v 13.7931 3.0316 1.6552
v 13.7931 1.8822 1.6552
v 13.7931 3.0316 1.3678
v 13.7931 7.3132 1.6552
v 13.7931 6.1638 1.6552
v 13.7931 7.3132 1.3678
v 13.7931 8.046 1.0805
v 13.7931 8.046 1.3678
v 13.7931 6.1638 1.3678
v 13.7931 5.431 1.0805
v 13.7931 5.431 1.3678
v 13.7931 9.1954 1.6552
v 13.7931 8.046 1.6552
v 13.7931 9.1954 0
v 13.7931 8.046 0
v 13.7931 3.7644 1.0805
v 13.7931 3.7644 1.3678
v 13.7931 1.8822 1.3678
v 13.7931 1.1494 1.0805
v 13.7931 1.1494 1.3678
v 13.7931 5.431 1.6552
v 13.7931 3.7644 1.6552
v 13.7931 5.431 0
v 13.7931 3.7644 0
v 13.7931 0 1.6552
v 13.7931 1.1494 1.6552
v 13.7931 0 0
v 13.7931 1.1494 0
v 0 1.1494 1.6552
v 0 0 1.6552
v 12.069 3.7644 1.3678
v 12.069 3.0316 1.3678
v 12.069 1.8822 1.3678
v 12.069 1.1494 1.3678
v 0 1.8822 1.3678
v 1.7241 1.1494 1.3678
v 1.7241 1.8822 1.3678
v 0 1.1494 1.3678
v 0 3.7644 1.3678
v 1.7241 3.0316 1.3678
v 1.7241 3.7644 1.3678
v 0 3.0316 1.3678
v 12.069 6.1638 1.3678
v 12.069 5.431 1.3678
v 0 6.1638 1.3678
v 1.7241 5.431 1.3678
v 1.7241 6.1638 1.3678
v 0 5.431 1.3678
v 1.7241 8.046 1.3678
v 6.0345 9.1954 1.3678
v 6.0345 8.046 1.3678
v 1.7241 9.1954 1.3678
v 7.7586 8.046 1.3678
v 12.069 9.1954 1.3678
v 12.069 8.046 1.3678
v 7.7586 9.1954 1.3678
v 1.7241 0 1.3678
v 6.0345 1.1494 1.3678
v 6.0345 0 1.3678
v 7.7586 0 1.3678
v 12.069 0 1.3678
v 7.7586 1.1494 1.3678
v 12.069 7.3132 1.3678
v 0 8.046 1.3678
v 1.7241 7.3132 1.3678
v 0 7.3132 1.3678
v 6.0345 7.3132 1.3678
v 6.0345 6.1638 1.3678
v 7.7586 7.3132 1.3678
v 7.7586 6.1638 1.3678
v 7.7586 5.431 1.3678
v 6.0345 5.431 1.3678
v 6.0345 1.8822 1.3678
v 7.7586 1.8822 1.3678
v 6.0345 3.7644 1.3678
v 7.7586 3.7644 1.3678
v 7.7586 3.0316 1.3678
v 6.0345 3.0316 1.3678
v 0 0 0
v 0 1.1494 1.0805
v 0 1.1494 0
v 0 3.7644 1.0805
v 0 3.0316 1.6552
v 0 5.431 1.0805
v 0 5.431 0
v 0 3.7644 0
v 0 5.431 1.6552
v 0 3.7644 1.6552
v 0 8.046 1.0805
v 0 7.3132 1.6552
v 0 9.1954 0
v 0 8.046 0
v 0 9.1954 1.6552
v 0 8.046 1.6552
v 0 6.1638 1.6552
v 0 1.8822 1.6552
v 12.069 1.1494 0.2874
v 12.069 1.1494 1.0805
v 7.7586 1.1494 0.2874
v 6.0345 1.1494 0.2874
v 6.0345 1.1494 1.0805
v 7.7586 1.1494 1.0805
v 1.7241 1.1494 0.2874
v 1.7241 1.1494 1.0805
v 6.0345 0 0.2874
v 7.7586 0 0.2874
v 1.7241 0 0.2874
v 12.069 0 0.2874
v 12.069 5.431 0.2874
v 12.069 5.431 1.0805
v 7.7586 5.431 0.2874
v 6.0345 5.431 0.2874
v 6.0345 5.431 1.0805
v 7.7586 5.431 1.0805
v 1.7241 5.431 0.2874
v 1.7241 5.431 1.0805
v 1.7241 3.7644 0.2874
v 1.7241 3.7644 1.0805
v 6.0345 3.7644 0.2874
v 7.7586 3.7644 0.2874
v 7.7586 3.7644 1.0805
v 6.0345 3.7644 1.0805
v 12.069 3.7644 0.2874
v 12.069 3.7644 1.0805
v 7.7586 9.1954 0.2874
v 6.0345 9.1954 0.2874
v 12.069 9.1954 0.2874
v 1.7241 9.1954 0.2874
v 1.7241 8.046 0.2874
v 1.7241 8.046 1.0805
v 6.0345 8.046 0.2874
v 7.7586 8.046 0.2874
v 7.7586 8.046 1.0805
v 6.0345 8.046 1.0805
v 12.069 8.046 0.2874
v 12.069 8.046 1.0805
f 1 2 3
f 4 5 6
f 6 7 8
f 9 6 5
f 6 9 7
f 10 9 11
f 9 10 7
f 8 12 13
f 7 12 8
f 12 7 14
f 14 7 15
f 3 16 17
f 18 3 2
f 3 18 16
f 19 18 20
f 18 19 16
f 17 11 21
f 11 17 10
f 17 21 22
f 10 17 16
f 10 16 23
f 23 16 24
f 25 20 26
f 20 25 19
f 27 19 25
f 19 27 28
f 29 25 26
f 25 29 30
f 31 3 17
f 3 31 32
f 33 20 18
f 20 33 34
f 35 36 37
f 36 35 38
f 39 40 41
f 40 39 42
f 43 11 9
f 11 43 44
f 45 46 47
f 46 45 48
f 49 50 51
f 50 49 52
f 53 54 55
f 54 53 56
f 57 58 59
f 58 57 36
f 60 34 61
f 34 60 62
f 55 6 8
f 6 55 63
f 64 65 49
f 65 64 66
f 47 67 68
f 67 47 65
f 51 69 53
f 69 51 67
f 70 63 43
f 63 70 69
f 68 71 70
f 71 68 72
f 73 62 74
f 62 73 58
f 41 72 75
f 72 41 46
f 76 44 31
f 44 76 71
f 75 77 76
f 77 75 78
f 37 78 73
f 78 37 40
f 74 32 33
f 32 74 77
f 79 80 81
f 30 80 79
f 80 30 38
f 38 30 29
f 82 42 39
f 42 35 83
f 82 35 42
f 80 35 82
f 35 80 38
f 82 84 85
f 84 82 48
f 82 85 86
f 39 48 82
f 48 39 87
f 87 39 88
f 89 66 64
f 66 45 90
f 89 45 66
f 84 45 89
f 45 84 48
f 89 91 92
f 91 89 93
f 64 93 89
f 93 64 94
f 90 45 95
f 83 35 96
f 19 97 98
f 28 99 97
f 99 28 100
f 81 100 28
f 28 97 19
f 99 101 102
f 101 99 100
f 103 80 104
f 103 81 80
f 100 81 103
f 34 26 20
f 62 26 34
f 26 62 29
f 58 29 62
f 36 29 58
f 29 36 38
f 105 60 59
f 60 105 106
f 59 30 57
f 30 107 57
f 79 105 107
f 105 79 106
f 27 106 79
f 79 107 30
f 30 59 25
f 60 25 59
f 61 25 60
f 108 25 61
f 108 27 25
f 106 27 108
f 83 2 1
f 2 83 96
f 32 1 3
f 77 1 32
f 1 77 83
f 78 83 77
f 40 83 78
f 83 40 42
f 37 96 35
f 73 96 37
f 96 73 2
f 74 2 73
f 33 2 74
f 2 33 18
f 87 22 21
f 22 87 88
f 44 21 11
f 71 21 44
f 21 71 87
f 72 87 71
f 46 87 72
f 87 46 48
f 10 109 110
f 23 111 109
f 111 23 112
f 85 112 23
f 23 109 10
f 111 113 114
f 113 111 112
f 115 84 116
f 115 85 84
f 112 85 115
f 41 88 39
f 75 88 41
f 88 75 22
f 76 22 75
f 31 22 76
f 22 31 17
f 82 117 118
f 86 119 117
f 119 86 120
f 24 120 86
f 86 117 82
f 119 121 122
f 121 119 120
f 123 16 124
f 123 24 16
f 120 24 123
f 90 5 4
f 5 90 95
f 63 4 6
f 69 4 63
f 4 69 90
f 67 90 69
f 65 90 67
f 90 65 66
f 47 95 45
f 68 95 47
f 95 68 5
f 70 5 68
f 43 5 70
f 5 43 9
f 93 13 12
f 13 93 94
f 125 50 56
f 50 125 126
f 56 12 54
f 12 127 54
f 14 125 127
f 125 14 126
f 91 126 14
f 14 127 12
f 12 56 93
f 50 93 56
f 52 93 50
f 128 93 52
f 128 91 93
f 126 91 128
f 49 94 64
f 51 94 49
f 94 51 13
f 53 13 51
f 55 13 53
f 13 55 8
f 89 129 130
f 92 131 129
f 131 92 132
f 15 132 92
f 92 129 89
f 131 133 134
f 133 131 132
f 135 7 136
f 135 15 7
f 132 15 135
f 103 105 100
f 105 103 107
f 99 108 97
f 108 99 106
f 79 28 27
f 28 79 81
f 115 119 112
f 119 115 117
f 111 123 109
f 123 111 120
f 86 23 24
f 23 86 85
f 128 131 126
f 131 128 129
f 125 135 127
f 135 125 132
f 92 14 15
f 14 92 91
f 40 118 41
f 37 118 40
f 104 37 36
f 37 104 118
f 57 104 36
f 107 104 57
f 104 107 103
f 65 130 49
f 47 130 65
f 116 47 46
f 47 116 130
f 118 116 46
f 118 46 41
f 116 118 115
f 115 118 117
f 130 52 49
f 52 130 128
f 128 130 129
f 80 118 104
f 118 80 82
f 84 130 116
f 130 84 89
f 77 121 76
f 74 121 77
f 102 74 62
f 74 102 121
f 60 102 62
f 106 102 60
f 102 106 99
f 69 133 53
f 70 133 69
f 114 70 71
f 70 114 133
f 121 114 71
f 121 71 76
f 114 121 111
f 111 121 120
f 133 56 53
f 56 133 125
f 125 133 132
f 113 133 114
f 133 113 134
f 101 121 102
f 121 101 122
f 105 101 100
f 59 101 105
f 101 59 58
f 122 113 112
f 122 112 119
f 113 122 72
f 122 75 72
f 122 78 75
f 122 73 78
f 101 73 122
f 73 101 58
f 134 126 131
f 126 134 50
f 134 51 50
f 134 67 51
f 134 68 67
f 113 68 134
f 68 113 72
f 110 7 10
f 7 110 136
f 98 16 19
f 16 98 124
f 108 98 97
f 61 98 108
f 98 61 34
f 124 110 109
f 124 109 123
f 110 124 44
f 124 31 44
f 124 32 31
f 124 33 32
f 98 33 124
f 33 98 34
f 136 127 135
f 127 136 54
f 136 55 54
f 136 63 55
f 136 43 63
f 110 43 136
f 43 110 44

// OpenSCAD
scale = 87;

width = 800;
length = 1200;
height = 144;

board_height = 25;
board_width = 150;
space = 63.75;
scale([1/scale,1/scale,1/scale]){
//length top
translate([0,0,height-board_height])
cube([length, 100, board_height]);
translate([0,100+(1*space),height-board_height])
cube([length, 100, board_height]);
translate([0,200+(2*space),height-board_height])
cube([length, 145, board_height]);
translate([0,345+(3*space),height-board_height])
cube([length, 100, board_height]);
translate([0,445+(4*space),height-board_height])
cube([length, 100, board_height]);

//length bot
translate([0,0,0])
cube([length, 100, board_height]);
//translate([0,100+(1*space),0])
//cube([length, 100, board_height]);
translate([0,200+(2*space),0])
cube([length, 145, board_height]);
//translate([0,345+(3*space),0])
//cube([length, 100, board_height]);
translate([0,445+(4*space),0])
cube([length, 100, board_height]);

//cross

translate([0,0,height-2*board_height])
cube([150, width, board_height]);
translate([length/2-75,0,height-2*board_height])
cube([150, width, board_height]);
translate([length-150,0,height-2*board_height])
cube([150, width, board_height]);

//cubes
//front
translate([0,0,0])
cube([150, 100, height]);
translate([length/2-75,0,0])
cube([150, 100, height]);
translate([length-150,0,0])
cube([150, 100, height]);
//mid
translate([0,200+(2*space),0])
cube([150, 145, height]);
translate([length/2-75,200+(2*space),0])
cube([150, 145, height]);
translate([length-150,200+(2*space),0])
cube([150, 145, height]);
//back
translate([0,445+(4*space),0])
cube([150, 100, height]);
translate([length/2-75,445+(4*space),0])
cube([150, 100, height]);
translate([length-150,445+(4*space),0])
cube([150, 100, height]);

}
